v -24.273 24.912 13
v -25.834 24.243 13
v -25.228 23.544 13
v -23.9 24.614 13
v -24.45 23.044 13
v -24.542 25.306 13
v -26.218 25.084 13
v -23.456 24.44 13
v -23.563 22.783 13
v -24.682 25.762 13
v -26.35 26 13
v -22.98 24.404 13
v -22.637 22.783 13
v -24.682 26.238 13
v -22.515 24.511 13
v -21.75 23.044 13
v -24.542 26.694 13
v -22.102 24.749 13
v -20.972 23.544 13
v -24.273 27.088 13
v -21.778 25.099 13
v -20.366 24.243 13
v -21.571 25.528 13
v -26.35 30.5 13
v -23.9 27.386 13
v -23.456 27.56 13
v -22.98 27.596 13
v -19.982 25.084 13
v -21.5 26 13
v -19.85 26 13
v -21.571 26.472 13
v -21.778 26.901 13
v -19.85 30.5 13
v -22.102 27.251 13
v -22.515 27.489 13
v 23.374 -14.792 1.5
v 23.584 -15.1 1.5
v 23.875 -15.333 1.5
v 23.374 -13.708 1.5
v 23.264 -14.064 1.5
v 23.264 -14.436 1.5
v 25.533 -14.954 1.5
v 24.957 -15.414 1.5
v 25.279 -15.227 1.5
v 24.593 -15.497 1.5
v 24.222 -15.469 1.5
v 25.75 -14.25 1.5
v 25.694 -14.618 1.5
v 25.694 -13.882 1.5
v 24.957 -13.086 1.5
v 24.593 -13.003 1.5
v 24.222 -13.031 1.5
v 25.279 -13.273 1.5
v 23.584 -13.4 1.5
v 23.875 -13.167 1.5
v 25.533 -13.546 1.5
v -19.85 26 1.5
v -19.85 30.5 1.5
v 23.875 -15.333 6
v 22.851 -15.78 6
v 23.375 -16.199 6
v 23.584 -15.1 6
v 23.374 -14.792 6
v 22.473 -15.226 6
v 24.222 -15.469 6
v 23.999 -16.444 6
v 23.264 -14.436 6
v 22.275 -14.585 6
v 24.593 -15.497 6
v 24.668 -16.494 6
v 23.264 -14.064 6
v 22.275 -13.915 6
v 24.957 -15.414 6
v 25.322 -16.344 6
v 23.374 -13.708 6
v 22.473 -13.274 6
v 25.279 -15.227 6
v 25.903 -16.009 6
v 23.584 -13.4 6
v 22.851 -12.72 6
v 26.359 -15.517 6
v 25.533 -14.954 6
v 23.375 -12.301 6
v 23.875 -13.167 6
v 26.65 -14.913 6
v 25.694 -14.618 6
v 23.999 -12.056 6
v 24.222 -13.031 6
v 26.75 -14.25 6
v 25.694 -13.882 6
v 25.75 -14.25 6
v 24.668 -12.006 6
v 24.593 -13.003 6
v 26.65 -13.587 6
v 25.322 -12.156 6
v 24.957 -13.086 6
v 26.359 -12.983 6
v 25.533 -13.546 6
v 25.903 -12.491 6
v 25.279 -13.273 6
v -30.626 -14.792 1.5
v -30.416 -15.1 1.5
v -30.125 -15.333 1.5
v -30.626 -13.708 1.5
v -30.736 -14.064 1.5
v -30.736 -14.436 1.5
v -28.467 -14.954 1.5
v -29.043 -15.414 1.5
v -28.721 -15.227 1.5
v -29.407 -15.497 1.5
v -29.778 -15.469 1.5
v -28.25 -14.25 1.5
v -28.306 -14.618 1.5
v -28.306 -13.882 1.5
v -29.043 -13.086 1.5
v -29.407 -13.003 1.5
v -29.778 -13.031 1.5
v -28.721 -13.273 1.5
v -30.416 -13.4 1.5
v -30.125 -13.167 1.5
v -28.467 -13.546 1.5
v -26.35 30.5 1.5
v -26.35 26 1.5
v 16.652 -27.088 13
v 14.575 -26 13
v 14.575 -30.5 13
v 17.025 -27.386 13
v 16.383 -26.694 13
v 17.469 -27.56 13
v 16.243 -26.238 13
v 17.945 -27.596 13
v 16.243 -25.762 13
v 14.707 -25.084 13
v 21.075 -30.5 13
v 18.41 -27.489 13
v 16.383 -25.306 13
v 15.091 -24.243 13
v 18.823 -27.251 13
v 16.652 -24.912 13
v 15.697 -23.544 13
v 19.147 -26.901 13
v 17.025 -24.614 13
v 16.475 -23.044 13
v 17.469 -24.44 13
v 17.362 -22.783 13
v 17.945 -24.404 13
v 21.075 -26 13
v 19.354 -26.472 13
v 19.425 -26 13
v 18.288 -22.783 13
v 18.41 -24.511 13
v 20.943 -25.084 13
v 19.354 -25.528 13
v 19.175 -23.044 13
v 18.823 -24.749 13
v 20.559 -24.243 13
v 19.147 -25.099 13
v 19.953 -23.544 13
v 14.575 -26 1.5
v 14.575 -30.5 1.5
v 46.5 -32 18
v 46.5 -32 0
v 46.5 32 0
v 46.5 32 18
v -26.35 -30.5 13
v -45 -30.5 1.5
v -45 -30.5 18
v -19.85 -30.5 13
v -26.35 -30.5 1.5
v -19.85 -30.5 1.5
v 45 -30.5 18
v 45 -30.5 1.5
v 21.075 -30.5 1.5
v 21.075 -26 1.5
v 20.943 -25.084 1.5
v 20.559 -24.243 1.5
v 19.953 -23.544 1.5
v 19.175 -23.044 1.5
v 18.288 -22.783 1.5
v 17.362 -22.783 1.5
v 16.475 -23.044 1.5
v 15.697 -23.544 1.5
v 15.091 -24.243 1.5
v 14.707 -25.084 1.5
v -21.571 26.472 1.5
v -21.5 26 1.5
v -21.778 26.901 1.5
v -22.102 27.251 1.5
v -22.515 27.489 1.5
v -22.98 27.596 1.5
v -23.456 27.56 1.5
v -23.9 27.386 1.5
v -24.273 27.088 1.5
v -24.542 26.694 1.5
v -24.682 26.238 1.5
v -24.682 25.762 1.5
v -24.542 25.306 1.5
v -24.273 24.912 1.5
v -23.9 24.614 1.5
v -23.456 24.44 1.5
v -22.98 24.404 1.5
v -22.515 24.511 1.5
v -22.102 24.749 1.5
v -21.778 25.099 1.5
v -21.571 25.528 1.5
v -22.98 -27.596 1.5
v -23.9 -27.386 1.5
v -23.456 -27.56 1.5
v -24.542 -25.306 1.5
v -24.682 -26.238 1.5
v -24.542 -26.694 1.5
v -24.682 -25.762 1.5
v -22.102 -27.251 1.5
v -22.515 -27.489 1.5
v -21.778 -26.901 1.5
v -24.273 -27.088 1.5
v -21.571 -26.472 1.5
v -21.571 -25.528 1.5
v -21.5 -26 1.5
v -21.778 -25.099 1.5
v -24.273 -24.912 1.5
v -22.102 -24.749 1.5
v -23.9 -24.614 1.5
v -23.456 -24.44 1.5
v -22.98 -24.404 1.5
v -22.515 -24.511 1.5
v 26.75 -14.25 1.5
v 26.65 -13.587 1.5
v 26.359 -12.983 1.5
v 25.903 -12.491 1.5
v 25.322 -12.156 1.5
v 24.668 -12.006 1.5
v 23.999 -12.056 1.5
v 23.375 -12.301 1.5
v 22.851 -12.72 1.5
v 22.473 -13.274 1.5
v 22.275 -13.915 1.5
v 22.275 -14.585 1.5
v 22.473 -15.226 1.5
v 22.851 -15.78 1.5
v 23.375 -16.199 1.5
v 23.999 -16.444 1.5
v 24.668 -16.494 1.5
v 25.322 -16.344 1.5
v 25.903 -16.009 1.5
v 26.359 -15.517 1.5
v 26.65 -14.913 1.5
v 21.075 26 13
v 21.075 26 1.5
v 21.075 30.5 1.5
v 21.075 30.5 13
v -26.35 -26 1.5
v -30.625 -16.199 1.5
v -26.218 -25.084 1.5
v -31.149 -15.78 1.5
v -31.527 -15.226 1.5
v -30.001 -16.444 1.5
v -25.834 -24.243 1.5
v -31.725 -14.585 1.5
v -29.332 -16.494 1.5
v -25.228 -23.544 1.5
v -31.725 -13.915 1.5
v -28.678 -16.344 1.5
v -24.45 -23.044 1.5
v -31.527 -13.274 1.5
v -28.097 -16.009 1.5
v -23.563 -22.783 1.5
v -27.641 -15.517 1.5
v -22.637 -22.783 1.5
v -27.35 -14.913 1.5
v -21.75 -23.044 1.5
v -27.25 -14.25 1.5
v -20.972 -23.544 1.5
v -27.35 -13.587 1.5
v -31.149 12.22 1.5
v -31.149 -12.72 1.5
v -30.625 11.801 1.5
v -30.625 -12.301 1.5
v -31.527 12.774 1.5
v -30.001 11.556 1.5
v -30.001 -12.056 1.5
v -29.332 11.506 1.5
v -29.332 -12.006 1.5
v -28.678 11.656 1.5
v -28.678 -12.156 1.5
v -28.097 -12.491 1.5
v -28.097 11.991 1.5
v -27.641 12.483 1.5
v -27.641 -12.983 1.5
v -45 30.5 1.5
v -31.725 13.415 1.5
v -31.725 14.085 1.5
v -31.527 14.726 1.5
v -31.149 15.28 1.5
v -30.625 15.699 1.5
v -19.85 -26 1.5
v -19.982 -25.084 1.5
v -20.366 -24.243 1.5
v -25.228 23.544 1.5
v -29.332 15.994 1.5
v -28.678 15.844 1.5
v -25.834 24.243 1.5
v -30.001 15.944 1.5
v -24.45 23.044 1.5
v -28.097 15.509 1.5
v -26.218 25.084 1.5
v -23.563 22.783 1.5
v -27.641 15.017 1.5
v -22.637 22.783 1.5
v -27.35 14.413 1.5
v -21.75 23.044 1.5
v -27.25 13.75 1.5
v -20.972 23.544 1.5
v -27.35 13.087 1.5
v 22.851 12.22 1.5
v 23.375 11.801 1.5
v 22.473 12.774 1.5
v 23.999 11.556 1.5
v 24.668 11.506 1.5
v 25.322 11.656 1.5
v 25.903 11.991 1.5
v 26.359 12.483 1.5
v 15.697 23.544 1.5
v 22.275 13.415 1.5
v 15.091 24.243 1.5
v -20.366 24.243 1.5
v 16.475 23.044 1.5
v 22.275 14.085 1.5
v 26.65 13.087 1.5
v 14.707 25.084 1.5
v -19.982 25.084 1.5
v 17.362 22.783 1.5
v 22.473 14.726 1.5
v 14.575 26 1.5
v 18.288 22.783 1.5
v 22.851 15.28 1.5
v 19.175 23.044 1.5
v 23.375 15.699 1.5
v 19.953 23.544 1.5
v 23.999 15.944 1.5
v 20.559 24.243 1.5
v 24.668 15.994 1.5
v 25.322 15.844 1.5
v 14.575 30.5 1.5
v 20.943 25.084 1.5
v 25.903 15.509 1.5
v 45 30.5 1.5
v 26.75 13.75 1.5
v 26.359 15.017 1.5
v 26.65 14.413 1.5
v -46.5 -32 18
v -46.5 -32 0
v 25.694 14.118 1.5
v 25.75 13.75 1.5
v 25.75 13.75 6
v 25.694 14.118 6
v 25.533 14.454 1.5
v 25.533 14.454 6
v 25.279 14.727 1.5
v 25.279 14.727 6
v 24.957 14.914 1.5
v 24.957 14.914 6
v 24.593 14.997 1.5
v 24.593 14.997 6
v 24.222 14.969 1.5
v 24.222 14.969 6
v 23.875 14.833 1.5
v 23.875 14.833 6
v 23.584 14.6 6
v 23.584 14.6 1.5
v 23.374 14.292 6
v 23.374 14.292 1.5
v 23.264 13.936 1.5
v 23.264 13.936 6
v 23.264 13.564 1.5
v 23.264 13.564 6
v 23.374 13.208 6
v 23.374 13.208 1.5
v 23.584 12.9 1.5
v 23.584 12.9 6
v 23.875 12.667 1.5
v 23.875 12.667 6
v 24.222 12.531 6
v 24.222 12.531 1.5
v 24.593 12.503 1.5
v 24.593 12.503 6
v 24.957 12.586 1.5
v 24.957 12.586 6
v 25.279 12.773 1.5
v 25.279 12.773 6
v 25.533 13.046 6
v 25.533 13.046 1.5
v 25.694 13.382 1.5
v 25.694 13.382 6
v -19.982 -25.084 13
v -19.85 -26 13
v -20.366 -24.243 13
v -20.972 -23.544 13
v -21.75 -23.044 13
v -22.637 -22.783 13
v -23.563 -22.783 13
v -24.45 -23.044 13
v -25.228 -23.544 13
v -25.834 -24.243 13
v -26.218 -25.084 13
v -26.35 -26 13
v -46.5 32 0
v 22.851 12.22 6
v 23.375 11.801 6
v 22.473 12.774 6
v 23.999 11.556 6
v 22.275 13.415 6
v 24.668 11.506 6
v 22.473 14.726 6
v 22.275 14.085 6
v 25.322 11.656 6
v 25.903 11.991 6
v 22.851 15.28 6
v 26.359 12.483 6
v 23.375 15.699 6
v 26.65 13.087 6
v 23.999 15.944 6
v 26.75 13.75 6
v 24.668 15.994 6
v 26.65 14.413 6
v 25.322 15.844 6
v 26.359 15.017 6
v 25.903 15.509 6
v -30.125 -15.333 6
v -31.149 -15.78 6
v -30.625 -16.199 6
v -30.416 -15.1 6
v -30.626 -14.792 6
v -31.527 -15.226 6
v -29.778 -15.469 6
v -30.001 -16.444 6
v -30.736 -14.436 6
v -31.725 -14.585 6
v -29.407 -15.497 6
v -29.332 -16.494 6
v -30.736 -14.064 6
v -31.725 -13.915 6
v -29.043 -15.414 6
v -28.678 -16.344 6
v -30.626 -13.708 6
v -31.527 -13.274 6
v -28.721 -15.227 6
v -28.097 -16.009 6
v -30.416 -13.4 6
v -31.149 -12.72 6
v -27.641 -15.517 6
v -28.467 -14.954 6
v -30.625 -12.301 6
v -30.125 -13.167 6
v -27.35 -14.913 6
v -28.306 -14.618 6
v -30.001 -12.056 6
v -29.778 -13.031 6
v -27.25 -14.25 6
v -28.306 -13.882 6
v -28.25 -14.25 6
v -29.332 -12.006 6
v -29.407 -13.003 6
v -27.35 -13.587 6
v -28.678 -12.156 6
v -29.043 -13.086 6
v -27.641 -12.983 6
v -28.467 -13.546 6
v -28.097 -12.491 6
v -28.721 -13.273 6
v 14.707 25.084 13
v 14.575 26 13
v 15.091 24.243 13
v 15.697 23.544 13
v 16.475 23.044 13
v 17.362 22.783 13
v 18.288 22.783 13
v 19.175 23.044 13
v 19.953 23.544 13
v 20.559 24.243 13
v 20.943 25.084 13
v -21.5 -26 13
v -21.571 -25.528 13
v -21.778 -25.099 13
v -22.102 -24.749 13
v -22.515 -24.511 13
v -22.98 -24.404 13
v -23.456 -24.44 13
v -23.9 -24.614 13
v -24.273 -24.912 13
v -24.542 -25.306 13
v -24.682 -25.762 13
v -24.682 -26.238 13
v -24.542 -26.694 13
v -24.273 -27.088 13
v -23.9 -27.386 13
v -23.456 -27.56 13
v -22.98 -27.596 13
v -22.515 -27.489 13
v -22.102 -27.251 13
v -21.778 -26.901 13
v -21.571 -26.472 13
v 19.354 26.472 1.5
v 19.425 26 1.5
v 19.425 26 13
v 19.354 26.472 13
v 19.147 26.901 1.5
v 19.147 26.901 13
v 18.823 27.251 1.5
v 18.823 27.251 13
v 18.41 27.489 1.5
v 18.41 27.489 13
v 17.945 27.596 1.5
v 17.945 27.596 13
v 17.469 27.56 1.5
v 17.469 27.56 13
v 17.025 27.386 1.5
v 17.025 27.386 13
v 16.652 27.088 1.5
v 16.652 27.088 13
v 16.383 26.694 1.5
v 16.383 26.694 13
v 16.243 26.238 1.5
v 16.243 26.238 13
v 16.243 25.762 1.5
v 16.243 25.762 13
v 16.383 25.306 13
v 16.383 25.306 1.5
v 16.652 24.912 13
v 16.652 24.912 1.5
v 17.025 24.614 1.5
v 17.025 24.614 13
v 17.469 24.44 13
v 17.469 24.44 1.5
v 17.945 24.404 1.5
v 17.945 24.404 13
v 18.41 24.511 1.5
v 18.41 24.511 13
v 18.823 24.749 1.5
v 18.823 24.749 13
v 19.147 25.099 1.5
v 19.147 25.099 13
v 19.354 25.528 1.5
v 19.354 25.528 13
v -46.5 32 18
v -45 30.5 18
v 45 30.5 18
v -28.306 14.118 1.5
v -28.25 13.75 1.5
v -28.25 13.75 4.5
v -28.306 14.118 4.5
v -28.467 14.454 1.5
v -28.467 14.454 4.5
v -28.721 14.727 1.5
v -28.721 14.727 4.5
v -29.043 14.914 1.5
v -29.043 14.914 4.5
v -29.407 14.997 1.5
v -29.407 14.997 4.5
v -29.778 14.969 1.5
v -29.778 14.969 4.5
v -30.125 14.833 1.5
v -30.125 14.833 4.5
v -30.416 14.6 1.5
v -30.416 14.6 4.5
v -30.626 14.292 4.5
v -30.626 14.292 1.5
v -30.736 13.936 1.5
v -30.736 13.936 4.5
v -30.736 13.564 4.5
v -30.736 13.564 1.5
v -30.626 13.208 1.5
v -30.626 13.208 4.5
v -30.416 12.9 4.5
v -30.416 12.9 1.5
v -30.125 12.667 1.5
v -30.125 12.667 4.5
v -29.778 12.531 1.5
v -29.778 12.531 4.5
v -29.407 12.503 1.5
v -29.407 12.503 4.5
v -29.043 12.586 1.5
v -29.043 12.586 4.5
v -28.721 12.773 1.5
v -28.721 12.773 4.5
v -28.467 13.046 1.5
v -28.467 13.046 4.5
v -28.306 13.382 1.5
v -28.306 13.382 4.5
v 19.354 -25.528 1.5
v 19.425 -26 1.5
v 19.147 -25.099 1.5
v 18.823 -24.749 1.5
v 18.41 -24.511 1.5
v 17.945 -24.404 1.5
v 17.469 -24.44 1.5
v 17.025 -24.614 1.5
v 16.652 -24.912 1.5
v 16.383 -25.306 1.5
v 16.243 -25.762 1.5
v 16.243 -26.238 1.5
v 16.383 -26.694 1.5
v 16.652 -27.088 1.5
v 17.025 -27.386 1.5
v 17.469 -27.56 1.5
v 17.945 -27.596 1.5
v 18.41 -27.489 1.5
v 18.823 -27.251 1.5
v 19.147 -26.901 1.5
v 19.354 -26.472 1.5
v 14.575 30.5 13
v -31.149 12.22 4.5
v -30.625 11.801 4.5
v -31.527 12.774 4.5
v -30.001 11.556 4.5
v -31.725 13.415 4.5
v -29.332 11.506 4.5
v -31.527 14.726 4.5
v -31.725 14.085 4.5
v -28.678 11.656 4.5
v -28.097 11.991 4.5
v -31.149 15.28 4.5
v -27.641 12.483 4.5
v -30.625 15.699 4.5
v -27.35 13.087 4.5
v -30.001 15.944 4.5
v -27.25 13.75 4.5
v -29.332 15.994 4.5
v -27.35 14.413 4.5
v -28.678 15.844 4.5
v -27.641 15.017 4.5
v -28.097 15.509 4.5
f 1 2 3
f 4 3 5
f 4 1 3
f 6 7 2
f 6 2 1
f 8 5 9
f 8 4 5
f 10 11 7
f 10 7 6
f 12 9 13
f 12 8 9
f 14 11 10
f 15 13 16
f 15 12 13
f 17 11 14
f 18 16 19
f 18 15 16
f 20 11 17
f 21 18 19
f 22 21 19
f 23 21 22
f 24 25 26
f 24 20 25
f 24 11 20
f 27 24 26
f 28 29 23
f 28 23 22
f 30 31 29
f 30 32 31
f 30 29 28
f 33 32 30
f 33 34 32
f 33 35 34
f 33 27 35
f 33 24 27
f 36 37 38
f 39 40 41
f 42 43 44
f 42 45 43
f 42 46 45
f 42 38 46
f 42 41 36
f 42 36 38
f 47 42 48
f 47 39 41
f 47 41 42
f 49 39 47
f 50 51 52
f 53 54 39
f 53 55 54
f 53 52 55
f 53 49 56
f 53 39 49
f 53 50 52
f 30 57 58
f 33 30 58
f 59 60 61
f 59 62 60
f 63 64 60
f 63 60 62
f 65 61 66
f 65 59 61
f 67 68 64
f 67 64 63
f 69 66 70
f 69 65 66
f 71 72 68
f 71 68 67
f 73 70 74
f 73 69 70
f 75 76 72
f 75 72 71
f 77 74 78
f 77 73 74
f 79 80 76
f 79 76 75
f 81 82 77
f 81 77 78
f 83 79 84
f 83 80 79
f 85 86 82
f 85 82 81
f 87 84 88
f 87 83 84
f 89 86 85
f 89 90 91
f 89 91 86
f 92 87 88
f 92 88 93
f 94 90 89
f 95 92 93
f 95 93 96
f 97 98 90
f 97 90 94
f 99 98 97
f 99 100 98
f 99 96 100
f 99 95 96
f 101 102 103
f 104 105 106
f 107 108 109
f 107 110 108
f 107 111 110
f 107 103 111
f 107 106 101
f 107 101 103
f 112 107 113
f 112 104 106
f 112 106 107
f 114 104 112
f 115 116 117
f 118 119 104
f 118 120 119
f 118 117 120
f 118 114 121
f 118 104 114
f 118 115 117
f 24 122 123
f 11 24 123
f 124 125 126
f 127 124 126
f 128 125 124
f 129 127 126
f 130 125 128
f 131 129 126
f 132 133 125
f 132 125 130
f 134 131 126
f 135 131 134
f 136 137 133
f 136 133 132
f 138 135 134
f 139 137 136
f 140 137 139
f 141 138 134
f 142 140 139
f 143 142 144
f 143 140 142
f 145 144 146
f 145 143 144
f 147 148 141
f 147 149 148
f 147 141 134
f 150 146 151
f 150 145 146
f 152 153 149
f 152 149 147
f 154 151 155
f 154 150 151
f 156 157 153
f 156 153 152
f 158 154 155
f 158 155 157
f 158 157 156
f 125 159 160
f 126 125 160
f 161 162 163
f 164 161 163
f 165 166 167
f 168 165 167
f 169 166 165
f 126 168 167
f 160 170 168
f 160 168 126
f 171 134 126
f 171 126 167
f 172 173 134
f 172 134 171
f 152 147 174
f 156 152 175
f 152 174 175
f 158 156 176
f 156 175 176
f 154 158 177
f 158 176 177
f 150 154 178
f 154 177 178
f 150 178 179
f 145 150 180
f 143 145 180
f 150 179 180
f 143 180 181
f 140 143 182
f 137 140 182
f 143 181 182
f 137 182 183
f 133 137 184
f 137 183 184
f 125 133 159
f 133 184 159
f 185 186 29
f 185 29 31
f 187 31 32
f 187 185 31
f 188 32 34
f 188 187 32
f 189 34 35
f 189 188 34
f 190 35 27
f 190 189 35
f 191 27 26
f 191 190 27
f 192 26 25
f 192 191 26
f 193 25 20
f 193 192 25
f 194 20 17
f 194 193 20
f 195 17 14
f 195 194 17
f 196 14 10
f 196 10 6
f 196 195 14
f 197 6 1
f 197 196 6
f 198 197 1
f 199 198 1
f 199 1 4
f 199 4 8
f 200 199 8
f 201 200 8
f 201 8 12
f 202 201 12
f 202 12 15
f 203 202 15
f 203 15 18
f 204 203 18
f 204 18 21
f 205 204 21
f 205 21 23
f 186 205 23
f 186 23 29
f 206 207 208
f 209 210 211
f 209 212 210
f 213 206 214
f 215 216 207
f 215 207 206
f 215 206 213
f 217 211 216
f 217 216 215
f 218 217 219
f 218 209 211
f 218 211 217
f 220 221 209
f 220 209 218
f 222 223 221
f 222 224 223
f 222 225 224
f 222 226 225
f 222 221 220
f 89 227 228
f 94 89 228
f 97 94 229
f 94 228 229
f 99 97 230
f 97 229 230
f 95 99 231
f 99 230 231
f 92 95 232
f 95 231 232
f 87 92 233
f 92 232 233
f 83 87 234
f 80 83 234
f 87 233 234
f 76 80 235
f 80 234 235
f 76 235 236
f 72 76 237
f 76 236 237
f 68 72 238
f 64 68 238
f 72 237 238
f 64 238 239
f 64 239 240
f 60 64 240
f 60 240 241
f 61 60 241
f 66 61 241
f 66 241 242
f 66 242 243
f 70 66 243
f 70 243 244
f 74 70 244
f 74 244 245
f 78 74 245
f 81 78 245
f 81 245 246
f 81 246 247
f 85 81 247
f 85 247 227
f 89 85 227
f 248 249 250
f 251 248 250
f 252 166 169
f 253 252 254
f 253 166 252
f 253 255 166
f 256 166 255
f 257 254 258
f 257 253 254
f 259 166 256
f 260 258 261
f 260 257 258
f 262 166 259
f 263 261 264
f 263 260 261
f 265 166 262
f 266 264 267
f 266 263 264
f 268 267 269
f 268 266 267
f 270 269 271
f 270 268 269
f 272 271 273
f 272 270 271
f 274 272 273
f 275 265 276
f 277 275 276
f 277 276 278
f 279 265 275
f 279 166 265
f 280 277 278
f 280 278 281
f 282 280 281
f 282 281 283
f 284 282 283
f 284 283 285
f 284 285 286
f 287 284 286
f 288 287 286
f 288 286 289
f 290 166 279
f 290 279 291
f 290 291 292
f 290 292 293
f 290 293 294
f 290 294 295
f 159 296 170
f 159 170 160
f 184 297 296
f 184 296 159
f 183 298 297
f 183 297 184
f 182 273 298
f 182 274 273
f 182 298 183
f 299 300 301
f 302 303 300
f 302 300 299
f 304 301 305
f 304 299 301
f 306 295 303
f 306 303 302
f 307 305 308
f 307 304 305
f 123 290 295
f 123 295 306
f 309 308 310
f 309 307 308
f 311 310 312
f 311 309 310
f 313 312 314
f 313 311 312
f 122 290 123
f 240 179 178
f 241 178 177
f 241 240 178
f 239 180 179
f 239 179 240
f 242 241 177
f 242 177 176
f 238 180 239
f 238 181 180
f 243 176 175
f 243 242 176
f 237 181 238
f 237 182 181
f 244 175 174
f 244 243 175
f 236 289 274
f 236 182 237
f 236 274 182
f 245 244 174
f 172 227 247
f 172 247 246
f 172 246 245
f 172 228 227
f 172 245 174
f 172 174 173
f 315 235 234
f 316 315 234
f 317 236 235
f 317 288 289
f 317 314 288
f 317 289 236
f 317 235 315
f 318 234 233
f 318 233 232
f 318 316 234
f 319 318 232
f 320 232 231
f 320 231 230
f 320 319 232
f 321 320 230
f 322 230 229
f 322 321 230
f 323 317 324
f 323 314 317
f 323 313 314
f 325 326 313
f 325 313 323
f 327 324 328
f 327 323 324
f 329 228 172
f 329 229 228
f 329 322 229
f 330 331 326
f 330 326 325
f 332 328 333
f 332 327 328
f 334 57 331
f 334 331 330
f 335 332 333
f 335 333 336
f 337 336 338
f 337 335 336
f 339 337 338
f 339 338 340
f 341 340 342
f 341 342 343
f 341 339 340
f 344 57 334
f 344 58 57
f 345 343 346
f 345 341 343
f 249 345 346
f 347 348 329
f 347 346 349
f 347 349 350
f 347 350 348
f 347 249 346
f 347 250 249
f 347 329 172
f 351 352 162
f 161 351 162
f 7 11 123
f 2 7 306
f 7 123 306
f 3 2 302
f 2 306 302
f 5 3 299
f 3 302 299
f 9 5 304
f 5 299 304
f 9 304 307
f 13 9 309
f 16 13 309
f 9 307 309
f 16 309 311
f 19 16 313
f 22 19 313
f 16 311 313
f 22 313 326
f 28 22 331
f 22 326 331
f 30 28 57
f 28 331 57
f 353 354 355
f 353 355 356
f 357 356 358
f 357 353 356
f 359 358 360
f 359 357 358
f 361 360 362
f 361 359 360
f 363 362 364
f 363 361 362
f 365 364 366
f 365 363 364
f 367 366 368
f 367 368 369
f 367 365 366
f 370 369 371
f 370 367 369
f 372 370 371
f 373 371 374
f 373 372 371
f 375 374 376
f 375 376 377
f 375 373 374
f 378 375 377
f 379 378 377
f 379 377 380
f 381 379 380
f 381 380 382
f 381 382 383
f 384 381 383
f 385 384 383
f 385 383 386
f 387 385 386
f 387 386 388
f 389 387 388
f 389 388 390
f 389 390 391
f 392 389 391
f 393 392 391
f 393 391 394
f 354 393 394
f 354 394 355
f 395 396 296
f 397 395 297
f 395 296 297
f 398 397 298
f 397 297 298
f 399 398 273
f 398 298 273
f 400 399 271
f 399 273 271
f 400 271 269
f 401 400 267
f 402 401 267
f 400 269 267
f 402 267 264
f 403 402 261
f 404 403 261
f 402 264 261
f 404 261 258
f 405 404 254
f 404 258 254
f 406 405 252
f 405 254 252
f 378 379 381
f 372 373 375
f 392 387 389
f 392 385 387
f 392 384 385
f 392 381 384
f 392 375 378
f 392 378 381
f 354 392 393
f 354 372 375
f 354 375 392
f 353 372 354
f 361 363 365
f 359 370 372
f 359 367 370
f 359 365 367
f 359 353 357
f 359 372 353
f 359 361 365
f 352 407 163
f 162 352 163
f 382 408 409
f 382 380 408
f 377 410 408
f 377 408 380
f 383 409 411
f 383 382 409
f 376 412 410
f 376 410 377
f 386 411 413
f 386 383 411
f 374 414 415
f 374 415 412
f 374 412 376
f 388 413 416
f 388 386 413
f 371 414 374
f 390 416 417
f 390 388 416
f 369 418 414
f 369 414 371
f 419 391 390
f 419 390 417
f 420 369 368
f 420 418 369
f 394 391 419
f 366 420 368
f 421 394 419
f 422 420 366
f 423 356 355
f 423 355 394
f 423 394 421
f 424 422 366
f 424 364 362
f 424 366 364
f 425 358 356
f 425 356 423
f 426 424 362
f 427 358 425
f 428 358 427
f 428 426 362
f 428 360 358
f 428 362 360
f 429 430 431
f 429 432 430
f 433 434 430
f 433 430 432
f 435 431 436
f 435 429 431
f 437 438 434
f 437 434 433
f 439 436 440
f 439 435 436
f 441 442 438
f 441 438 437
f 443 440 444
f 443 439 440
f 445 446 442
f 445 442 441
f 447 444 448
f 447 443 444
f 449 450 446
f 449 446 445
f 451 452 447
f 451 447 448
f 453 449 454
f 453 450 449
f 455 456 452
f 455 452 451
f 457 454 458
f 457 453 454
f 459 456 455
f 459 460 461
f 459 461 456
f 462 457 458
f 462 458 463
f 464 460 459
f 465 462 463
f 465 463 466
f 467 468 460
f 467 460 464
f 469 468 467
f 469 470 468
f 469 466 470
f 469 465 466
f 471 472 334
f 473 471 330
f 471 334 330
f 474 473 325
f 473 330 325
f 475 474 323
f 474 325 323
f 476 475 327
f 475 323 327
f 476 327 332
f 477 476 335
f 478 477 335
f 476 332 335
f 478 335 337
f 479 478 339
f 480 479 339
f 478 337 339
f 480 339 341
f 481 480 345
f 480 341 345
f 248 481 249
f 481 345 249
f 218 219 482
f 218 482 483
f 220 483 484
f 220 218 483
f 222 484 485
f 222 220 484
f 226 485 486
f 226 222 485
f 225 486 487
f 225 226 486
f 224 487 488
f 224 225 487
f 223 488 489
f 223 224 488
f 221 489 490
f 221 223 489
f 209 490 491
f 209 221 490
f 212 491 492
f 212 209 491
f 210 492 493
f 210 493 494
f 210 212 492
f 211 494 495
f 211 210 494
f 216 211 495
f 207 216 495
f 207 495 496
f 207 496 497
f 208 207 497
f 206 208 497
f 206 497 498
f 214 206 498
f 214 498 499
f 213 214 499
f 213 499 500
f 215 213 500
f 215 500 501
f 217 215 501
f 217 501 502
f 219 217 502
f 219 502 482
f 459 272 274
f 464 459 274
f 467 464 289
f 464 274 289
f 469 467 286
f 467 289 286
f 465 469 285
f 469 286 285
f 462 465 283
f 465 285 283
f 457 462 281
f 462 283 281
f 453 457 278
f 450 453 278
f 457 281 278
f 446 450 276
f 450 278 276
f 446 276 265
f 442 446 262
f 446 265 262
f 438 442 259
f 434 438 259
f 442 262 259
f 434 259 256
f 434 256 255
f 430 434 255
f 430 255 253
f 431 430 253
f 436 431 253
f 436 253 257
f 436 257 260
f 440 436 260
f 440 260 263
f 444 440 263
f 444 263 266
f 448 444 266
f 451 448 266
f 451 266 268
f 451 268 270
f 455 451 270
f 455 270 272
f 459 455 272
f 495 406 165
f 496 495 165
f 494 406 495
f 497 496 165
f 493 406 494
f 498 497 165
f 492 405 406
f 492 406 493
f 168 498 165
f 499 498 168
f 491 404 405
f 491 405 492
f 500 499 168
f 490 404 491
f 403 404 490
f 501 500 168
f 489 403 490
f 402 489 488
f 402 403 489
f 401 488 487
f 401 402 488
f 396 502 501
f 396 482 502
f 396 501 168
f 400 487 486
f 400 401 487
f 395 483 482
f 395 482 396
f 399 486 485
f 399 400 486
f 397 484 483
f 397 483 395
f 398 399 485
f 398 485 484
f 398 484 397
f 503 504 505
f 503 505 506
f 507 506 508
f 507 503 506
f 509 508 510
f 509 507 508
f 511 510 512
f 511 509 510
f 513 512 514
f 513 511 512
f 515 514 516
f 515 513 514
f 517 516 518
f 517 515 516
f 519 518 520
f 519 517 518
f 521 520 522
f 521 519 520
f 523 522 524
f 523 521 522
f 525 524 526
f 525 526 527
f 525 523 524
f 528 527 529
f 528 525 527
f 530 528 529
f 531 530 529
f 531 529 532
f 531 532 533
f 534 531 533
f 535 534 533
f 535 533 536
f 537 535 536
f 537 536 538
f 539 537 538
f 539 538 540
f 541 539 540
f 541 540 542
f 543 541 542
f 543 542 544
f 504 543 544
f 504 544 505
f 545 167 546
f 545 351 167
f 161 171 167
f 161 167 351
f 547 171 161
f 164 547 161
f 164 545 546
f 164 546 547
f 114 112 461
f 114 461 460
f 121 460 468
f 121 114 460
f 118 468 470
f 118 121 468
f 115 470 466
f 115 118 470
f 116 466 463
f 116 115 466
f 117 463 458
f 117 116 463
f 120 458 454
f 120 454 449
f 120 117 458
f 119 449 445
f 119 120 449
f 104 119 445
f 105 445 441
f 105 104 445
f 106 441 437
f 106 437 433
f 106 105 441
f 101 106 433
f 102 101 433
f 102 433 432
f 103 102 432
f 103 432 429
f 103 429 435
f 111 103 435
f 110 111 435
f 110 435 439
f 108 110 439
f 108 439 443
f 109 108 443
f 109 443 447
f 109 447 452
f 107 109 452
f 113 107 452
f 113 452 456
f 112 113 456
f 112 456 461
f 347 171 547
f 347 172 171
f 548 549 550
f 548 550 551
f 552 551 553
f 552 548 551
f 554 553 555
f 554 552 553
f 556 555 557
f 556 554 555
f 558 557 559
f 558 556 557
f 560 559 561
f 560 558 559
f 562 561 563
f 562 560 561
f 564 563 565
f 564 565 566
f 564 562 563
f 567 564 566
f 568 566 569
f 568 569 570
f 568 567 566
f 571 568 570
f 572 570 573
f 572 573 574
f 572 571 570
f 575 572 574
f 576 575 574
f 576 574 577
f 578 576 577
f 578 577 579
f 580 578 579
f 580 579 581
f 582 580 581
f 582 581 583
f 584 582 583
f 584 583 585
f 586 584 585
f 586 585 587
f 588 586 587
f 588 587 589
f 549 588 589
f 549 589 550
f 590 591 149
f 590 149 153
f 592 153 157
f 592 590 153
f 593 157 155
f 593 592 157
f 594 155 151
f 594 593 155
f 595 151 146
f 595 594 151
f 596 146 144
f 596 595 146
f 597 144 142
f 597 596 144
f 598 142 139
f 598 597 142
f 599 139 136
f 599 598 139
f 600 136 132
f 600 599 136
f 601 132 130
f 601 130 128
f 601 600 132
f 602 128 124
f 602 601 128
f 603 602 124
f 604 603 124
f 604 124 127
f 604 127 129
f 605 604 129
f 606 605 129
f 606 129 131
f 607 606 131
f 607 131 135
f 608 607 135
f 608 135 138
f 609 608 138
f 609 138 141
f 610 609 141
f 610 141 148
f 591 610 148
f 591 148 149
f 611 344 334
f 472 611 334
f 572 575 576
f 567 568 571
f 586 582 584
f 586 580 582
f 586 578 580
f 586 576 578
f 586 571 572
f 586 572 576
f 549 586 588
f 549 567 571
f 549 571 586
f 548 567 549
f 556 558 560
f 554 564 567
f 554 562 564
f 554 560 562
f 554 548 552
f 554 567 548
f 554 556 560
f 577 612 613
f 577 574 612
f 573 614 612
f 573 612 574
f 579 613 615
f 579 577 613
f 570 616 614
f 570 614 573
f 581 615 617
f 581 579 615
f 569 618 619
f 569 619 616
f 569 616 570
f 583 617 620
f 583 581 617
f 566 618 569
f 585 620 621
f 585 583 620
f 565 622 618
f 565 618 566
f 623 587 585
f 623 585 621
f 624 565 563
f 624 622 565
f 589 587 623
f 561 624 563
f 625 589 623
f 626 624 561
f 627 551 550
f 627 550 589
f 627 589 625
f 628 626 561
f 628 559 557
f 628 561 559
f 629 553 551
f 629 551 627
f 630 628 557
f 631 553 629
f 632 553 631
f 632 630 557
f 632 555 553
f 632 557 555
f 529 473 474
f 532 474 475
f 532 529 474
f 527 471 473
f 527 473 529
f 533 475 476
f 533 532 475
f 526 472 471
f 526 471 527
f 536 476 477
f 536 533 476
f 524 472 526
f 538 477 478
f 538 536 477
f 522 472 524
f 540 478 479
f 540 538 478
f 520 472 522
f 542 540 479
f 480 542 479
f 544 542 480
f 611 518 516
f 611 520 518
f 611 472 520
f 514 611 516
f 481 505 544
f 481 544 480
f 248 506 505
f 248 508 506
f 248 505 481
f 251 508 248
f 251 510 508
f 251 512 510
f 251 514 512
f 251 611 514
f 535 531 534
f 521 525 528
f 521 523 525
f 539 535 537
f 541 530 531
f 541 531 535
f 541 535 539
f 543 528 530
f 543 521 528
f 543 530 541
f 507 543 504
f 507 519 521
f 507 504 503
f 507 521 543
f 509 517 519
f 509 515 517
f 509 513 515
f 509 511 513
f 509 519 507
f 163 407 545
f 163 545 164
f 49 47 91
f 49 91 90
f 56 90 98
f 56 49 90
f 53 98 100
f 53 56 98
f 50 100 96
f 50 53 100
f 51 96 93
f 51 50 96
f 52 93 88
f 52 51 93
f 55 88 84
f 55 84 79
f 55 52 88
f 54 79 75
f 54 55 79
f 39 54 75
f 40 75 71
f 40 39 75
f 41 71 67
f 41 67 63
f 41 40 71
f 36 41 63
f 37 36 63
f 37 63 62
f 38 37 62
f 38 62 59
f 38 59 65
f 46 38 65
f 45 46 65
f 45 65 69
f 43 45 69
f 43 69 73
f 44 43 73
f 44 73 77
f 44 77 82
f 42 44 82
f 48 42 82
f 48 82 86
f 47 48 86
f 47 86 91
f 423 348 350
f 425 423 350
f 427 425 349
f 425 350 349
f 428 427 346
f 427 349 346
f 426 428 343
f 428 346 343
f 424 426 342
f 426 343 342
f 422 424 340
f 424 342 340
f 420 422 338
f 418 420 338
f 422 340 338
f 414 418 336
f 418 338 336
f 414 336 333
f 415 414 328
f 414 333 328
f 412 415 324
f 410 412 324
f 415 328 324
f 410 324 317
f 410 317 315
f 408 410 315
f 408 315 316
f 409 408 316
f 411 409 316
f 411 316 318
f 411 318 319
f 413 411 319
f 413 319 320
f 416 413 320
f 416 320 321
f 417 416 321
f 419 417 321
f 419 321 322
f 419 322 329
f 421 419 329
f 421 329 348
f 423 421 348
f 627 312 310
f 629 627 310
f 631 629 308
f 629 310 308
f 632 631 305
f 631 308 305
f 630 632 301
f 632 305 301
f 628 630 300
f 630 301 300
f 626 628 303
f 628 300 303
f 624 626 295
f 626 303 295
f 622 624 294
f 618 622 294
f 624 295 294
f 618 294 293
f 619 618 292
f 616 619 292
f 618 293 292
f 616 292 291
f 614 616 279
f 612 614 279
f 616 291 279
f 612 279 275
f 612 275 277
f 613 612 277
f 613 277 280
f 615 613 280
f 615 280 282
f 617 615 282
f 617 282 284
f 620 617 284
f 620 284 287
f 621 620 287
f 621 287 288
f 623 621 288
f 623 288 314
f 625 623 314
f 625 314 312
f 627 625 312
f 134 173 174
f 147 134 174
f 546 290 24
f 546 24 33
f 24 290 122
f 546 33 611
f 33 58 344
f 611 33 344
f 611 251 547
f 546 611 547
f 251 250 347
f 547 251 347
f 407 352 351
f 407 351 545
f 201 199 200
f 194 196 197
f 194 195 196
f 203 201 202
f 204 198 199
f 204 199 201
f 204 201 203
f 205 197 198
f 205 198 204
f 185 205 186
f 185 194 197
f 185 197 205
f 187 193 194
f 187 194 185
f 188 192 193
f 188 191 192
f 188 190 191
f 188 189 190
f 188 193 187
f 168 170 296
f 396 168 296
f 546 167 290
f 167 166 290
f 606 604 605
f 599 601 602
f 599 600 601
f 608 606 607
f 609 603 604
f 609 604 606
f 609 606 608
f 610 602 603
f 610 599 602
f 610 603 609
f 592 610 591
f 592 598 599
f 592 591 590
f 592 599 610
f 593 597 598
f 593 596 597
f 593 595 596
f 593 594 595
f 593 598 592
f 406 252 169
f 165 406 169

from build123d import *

# Parameters (mm, degrees)
F0_W     = 93
F0_H     = 64
F1_DEPTH = 18
F2_T     = -1.5
F3_R     = 2.25
F3_R_2   = 1.25
F4_DEPTH = 6
F5_DEPTH = 4.5
F3_R_3   = 1.6
F6_DEPTH = 13


with BuildPart() as f1:
    # F0 (on Top) → F1 (new body)
    with BuildSketch(Plane.XY):
        Rectangle(F0_W, F0_H)
    extrude(amount=F1_DEPTH)

    # F2
    f2_openings = [f1.faces().sort_by_distance(p)[0] for p in [
        (0, 0, 18),
    ]]
    offset(amount=F2_T, openings=f2_openings)

    # F3 (on Top) → F4 (join)
    with BuildSketch(Plane.XY):
        with Locations((-29.5, -14.25)):
            Circle(F3_R)
        with Locations((-29.5, -14.25)):
            Circle(F3_R_2, mode=Mode.SUBTRACT)
        with Locations((24.5, -14.25)):
            Circle(F3_R)
        with Locations((24.5, -14.25)):
            Circle(F3_R_2, mode=Mode.SUBTRACT)
        with Locations((24.5, 13.75)):
            Circle(F3_R)
        with Locations((24.5, 13.75)):
            Circle(F3_R_2, mode=Mode.SUBTRACT)
    extrude(amount=F4_DEPTH)

    # F3 (on Top) → F5 (join)
    with BuildSketch(Plane.XY):
        with Locations((-29.5, 13.75)):
            Circle(F3_R)
        with Locations((-29.5, 13.75)):
            Circle(F3_R_2, mode=Mode.SUBTRACT)
    extrude(amount=F5_DEPTH)

    # F3 (on Top) → F6 (join)
    with BuildSketch(Plane.XY):
        with BuildLine():
            Line((-19.85, 31), (-26.35, 31))
            Line((-26.35, 31), (-26.35, 26))
            ThreePointArc((-26.35, 26), (-23.1, 22.75), (-19.85, 26))
            Line((-19.85, 26), (-19.85, 31))
        make_face()
        with Locations((-23.1, 26)):
            Circle(F3_R_3, mode=Mode.SUBTRACT)
        with BuildLine():
            Line((21.075, 31), (14.575, 31))
            Line((14.575, 31), (14.575, 26))
            ThreePointArc((14.575, 26), (17.825, 22.75), (21.075, 26))
            Line((21.075, 26), (21.075, 31))
        make_face()
        with Locations((17.825, 26)):
            Circle(F3_R_3, mode=Mode.SUBTRACT)
        with BuildLine():
            Line((14.575, -26), (14.575, -31))
            Line((14.575, -31), (21.075, -31))
            Line((21.075, -31), (21.075, -26))
            ThreePointArc((21.075, -26), (17.825, -22.75), (14.575, -26))
        make_face()
        with Locations((17.825, -26)):
            Circle(F3_R_3, mode=Mode.SUBTRACT)
        with BuildLine():
            Line((-26.35, -26), (-26.35, -31))
            Line((-26.35, -31), (-19.85, -31))
            Line((-19.85, -31), (-19.85, -26))
            ThreePointArc((-19.85, -26), (-23.1, -22.75), (-26.35, -26))
        make_face()
        with Locations((-23.1, -26)):
            Circle(F3_R_3, mode=Mode.SUBTRACT)
    extrude(amount=F6_DEPTH)


solid = f1.part
